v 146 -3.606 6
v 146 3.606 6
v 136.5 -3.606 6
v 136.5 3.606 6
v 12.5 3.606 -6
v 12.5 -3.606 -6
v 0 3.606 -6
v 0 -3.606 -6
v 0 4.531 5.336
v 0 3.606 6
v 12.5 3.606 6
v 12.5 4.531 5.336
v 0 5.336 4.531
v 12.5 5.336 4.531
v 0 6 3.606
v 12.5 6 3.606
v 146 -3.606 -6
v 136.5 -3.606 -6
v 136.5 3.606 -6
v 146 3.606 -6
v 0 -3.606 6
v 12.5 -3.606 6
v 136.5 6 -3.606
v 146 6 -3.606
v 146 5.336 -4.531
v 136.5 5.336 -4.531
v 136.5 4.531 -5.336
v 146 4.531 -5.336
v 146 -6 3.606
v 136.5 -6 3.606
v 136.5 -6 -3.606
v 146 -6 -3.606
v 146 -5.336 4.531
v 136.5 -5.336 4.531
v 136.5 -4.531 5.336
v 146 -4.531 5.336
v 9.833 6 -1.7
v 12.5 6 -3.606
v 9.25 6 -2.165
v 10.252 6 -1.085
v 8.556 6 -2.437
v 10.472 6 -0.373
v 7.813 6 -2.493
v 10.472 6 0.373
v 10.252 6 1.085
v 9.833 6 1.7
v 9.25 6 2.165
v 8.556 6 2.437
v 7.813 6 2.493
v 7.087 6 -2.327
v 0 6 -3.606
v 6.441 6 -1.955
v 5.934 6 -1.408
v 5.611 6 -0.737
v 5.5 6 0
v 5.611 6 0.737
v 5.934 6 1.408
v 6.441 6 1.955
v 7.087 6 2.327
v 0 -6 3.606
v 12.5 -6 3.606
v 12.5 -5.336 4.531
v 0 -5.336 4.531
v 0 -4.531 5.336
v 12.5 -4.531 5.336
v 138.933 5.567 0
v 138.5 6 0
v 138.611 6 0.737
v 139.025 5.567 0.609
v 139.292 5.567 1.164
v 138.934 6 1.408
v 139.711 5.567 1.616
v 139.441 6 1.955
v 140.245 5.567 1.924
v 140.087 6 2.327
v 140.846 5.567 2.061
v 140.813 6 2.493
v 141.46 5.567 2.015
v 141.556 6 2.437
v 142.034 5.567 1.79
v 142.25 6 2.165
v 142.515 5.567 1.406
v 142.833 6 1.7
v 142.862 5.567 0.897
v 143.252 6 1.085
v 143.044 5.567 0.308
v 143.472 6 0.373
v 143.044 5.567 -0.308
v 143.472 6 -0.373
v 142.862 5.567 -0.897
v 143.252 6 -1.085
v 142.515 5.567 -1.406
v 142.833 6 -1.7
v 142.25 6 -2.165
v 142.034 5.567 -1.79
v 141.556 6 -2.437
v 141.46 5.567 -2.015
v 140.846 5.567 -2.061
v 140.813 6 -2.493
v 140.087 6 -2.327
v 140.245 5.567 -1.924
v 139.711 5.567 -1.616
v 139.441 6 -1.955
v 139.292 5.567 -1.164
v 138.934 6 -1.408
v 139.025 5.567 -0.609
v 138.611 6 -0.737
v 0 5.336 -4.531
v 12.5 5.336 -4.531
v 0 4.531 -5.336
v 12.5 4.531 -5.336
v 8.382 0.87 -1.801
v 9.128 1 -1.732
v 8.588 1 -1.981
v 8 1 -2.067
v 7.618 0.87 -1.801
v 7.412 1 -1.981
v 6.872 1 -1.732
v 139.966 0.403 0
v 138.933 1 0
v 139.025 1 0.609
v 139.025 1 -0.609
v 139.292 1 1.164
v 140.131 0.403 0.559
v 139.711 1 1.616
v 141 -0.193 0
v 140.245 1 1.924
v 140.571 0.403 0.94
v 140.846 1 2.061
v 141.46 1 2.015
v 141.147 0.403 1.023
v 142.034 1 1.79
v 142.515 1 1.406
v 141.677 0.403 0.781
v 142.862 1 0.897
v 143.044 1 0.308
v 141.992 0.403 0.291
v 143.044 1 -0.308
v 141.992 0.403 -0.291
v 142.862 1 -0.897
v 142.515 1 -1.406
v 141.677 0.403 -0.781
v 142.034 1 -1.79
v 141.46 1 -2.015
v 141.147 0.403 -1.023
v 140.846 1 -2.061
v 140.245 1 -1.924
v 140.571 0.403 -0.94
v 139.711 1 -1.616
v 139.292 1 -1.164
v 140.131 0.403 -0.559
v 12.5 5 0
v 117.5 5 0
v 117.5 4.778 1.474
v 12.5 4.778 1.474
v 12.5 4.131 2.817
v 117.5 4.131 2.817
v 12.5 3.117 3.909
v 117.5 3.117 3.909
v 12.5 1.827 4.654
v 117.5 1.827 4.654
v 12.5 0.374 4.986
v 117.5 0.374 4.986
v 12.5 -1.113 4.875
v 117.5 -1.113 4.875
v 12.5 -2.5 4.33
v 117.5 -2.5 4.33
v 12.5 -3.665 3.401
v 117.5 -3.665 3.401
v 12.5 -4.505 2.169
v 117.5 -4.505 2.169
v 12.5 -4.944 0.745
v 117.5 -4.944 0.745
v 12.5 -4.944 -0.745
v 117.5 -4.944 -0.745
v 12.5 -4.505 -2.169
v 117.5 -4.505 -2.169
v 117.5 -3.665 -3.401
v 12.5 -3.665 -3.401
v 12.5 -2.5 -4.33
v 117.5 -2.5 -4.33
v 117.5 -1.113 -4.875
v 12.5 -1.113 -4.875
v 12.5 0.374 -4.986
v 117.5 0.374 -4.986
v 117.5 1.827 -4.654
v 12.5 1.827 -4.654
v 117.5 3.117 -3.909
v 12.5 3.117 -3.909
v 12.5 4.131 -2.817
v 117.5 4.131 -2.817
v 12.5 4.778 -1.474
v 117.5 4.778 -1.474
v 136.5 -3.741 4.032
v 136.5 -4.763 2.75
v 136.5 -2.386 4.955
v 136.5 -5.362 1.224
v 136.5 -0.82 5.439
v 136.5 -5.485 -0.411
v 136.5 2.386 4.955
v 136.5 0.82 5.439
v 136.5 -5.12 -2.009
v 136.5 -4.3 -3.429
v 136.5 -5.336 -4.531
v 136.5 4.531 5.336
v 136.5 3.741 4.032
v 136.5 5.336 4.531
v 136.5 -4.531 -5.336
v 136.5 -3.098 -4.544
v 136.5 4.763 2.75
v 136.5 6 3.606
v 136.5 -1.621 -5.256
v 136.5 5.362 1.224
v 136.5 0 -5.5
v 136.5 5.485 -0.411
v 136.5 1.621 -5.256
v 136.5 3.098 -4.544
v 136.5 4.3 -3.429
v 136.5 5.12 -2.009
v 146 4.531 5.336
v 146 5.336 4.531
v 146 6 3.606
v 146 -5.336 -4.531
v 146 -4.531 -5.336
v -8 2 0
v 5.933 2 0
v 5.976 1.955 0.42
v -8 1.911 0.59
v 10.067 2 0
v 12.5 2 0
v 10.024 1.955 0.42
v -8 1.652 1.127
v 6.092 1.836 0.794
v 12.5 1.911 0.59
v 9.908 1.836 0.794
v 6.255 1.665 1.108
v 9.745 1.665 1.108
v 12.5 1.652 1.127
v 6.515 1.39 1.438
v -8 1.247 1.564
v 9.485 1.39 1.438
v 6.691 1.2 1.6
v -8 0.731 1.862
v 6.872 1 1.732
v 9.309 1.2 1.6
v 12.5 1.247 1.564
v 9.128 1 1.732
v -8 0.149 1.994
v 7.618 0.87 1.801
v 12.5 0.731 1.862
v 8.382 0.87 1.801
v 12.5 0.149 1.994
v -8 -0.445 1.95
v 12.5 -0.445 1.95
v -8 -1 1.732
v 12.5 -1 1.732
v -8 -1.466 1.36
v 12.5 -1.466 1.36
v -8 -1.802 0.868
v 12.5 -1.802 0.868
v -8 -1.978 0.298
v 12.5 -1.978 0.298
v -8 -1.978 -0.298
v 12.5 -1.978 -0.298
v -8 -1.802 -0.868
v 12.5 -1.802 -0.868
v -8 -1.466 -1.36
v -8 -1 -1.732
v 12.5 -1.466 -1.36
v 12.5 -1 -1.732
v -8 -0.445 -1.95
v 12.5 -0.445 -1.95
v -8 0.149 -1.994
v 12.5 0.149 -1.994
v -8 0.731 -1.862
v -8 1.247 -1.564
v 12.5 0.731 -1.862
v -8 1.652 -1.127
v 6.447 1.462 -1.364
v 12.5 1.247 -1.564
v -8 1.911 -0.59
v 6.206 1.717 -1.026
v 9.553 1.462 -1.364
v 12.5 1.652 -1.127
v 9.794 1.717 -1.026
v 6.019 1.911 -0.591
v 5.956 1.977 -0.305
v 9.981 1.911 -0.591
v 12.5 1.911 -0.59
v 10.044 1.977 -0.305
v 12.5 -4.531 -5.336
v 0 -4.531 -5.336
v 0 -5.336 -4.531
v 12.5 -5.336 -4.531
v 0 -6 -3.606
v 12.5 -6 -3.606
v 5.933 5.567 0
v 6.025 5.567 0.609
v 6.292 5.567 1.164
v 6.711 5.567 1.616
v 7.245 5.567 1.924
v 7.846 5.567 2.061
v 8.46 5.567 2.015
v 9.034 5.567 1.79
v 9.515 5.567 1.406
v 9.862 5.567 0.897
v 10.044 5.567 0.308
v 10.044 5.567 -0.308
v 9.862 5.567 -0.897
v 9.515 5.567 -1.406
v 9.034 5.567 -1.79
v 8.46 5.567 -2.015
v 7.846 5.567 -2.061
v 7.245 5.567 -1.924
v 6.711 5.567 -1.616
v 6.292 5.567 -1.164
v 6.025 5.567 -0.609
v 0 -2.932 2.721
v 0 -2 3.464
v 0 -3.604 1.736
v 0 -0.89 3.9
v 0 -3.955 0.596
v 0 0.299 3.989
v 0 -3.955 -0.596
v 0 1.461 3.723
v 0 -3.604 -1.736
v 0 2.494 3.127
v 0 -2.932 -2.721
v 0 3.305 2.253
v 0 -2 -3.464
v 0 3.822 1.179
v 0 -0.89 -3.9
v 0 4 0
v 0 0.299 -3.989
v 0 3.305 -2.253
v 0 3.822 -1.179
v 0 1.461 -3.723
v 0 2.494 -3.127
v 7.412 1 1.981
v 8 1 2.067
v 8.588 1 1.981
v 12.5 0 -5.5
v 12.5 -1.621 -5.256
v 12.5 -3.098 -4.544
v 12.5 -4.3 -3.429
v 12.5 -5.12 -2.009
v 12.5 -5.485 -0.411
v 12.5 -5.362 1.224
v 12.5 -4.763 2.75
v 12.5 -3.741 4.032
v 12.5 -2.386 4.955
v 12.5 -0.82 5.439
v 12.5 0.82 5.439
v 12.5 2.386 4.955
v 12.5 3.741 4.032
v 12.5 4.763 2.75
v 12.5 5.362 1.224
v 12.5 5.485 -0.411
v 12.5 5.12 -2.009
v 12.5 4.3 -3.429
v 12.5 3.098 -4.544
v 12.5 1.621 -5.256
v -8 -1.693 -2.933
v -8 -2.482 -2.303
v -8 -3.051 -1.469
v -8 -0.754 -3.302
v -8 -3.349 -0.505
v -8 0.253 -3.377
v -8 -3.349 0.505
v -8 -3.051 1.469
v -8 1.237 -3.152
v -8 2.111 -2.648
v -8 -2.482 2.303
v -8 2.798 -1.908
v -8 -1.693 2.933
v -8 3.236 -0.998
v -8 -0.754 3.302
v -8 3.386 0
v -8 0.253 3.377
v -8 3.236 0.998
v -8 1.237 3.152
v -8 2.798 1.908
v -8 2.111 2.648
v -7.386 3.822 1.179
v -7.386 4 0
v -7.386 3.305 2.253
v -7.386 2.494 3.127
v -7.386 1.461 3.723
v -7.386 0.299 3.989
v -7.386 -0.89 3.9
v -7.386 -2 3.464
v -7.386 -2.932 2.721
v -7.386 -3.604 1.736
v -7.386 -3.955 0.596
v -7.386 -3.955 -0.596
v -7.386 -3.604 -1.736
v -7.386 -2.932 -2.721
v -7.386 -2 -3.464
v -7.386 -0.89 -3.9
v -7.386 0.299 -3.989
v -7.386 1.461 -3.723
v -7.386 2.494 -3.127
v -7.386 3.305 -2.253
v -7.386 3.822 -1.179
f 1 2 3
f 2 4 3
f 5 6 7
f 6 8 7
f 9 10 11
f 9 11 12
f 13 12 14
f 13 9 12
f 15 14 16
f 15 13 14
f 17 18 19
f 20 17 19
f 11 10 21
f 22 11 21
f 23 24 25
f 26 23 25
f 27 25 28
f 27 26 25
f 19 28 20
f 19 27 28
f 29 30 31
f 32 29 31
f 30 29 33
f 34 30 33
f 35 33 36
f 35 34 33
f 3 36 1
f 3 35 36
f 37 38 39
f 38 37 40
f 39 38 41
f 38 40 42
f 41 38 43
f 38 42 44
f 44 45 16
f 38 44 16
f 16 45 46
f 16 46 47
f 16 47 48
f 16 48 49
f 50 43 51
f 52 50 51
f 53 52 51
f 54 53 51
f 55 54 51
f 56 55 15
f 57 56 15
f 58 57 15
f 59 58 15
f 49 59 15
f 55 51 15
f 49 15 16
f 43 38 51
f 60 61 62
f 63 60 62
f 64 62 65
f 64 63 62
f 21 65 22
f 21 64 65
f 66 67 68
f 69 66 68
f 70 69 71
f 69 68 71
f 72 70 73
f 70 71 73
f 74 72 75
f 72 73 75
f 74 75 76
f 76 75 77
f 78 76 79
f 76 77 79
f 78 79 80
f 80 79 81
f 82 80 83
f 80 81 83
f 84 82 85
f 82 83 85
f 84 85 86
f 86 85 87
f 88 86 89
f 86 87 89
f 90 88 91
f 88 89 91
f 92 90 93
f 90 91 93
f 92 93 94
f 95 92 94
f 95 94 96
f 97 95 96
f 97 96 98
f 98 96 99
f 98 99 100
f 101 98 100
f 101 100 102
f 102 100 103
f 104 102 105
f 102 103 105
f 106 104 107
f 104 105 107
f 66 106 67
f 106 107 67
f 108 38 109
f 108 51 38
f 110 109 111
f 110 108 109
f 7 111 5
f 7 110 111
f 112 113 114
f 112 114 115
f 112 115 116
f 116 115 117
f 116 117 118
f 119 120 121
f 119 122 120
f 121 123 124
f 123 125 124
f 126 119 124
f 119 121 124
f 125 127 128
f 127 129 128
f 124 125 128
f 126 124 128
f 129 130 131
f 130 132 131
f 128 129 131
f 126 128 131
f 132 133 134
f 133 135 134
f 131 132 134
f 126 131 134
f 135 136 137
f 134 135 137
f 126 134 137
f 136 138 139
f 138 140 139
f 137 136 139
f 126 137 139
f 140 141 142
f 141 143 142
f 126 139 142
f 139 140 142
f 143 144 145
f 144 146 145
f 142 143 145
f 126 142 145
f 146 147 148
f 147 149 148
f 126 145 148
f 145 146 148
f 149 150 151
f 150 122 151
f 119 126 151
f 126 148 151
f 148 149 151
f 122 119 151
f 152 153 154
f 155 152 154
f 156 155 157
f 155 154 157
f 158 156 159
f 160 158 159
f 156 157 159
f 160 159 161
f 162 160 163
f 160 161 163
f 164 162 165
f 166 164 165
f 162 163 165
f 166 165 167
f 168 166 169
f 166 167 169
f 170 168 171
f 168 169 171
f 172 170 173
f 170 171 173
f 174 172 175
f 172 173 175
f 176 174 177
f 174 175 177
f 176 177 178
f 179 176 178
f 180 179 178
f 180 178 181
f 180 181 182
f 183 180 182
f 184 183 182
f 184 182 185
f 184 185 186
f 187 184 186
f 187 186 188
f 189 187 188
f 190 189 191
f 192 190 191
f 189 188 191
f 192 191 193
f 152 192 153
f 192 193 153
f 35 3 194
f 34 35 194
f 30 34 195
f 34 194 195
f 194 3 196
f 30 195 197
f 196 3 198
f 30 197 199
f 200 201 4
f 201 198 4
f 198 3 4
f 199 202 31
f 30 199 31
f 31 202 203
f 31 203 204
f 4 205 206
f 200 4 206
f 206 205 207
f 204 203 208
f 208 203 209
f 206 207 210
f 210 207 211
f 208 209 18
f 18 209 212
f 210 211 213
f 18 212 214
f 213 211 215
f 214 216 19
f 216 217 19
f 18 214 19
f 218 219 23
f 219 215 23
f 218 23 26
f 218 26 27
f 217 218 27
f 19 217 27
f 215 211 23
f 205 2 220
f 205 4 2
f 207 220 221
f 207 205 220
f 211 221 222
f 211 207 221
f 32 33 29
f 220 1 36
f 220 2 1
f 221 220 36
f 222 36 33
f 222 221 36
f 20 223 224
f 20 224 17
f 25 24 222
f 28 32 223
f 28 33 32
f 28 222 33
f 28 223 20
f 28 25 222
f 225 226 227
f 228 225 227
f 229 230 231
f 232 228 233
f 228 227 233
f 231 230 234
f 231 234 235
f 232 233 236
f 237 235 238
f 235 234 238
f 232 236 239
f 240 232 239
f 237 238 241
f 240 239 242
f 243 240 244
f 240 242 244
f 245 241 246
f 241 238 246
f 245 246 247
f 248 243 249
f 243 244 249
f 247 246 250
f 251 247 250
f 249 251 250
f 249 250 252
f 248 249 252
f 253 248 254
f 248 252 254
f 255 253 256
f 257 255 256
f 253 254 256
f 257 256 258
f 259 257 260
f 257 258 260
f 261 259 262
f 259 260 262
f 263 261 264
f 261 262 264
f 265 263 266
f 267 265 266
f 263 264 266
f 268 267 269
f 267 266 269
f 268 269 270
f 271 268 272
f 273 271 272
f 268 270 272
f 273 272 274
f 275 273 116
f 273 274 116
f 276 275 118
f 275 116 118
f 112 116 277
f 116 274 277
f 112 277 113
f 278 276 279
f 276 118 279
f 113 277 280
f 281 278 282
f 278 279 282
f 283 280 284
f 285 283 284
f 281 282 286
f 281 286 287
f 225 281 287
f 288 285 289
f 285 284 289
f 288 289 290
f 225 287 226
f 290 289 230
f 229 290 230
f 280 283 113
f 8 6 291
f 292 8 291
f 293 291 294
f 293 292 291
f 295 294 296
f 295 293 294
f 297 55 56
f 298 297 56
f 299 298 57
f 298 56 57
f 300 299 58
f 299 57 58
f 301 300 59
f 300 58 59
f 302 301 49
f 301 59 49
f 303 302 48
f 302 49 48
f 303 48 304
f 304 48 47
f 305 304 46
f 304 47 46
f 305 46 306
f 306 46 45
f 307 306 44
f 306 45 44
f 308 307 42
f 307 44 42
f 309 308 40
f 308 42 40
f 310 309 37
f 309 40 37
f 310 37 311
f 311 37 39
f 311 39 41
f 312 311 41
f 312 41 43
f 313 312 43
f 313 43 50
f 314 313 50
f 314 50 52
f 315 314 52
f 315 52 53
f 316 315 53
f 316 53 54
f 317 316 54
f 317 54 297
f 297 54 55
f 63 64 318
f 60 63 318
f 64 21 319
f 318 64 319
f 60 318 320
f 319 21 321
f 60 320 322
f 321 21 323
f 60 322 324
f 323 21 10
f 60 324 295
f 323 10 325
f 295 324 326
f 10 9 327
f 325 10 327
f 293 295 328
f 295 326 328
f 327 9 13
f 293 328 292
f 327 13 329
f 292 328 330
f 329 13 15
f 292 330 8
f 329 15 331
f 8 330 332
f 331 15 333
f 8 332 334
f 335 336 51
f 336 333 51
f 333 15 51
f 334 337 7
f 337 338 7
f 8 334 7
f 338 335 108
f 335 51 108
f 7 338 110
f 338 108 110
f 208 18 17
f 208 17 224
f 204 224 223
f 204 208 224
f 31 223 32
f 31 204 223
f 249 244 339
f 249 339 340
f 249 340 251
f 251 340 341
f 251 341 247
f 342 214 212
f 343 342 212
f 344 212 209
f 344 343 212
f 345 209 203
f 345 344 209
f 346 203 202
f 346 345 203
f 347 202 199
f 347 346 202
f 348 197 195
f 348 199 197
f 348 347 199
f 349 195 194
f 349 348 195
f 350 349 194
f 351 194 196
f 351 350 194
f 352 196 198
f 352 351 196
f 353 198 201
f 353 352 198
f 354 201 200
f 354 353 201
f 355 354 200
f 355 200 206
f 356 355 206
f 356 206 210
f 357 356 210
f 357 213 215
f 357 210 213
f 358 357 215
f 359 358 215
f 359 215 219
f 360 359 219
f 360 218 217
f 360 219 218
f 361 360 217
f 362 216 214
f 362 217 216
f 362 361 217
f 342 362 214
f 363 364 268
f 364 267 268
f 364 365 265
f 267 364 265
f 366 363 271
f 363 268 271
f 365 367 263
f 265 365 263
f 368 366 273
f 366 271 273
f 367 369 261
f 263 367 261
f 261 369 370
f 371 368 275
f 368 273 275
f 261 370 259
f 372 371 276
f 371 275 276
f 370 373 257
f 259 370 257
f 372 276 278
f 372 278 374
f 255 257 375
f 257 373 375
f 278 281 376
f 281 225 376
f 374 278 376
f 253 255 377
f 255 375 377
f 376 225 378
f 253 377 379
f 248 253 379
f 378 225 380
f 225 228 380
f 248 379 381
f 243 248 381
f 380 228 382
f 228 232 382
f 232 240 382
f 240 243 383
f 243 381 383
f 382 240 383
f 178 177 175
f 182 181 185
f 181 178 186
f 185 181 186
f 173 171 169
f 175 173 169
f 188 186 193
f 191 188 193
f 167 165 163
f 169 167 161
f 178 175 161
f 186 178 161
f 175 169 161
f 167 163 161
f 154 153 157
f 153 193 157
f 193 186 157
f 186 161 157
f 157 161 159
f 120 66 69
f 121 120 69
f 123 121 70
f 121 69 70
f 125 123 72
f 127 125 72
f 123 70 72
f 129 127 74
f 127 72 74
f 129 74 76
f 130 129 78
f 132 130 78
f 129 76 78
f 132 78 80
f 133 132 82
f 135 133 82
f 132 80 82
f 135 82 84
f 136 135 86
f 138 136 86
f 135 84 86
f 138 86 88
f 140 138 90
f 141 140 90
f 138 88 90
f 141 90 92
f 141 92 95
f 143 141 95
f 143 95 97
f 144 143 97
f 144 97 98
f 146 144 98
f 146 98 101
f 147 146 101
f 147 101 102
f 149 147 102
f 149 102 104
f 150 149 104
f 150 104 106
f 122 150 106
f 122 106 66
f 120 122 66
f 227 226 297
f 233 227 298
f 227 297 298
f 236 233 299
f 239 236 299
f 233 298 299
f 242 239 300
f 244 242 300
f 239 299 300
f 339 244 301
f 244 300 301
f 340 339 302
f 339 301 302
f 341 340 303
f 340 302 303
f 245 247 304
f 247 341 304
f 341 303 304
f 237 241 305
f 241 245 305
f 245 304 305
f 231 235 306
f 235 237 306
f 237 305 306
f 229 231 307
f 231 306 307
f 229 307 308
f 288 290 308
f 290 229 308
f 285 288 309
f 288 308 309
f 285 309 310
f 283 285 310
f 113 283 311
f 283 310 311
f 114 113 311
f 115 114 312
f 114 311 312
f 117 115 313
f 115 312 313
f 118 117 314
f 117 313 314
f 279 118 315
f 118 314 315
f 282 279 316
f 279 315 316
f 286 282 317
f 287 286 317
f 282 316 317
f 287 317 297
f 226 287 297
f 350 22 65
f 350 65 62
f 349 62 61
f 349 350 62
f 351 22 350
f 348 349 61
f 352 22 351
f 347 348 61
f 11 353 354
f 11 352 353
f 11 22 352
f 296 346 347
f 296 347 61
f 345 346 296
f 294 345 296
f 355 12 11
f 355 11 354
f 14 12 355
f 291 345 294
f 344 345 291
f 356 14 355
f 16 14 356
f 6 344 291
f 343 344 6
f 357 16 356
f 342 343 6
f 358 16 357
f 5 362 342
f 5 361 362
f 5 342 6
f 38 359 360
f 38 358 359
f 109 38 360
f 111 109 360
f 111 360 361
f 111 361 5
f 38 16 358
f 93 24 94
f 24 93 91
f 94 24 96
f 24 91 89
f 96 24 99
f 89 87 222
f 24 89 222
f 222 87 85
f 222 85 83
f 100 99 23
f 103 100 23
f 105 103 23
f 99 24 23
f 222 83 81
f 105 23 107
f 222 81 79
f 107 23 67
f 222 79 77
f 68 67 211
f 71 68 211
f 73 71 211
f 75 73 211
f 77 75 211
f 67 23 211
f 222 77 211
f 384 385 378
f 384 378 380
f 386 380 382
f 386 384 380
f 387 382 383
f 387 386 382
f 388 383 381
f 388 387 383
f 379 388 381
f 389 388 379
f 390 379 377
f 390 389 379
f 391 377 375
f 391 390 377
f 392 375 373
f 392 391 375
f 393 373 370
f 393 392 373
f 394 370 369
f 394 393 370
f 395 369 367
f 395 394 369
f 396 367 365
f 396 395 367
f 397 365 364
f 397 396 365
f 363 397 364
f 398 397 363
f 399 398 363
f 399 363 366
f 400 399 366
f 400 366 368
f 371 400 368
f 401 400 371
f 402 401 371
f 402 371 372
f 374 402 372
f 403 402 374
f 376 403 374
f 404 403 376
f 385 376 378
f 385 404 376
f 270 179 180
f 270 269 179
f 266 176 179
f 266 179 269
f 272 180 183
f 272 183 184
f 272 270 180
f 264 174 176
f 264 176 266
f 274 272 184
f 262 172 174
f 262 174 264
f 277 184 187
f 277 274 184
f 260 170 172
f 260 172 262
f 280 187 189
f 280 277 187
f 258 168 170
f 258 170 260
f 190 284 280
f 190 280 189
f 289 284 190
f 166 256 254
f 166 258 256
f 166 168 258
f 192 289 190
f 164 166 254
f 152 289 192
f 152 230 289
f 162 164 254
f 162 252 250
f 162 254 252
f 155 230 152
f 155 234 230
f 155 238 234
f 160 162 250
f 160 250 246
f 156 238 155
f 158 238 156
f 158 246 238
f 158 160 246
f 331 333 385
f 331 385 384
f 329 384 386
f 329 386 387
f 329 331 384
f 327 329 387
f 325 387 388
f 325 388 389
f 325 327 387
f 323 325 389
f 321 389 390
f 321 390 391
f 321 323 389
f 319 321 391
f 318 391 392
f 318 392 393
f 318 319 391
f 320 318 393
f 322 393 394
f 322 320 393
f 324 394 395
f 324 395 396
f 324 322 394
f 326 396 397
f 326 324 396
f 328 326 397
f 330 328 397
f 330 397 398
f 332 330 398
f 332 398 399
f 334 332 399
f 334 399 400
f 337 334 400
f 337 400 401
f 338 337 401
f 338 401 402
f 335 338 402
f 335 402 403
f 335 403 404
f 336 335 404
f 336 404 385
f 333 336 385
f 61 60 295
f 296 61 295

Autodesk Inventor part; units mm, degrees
sketch "Sketch_8" plane through (0, 0, 0) normal (0, 0, 1) x (1, 0, 0)
  line L0 (0, 0) -> (-8, 0)
  line L1 (-8, 0) -> (-8, 3.3865)
  line L2 (-8, 3.3865) -> (-7.3865, 4)
  line L3 (-7.3865, 4) -> (0, 4)
  line L4 (0, 4) -> (0, 0)
  line L5 (0, 0) -> (-8, 0)
revolve "Revolution1" add sketch "Sketch_8" angle 360 about axis through (0, 0, 0) along (1, 0, 0)
thread "Thread1" size "M8x1" class "6g" standard "ISO Metric profile" length 5.8865
sketch "Sketch_9" plane through (0, 0, 0) normal (1, 0, 0) x (0, 0, -1)
  line L0 (-6, 3.6056) -> (-6, -3.6056)
  arc A0 (-6, -3.6056) -> (-3.6056, -6) centre (0, 0) ccw
  line L1 (-3.6056, -6) -> (3.6056, -6)
  arc A1 (3.6056, -6) -> (6, -3.6056) centre (0, 0) ccw
  line L2 (6, -3.6056) -> (6, 3.6056)
  arc A2 (6, 3.6056) -> (3.6056, 6) centre (0, 0) ccw
  line L3 (3.6056, 6) -> (-3.6056, 6)
  arc A3 (-3.6056, 6) -> (-6, 3.6056) centre (0, 0) ccw
extrude "Extrusion1" add sketch "Sketch_9" along normal blind 12.5
sketch "Sketch_6" plane through (12.5, 0, 0) normal (1, 0, 0) x (0, 0, -1)
  circle A0 centre (0, 0) radius 5.5
extrude "Extrusion2" add sketch "Sketch_6" along normal blind 124
sketch "Sketch_10" plane through (136.5, 0, 0) normal (1, 0, 0) x (0, 0, -1)
  line L0 (-6, 3.6056) -> (-6, -3.6056)
  arc A0 (-6, -3.6056) -> (-3.6056, -6) centre (0, 0) ccw
  line L1 (-3.6056, -6) -> (3.6056, -6)
  arc A1 (3.6056, -6) -> (6, -3.6056) centre (0, 0) ccw
  line L2 (6, -3.6056) -> (6, 3.6056)
  arc A2 (6, 3.6056) -> (3.6056, 6) centre (0, 0) ccw
  line L3 (3.6056, 6) -> (-3.6056, 6)
  arc A3 (-3.6056, 6) -> (-6, 3.6056) centre (0, 0) ccw
extrude "Extrusion3" add sketch "Sketch_10" along normal blind 9.5
sketch "Sketch7" plane through (0, 0, 0) normal (0, 0, 1) x (1, 0, 0)
  line L0 (8, 6) -> (8, 1)
  line L1 (8, -0.1934) -> (5.933, 1)
  line L2 (5.933, 1) -> (5.933, 5.567)
  line L3 (5.933, 5.567) -> (5.5, 6)
  line L4 (5.5, 6) -> (8, 6)
  line L5 (8, 6) -> (8, -0.1934)
revolve "Revolution2" cut sketch "Sketch7" angle 360 about axis through (8, 6, 0) along (0, 1, 0)
thread "Thread2" size "M5x0.8" class "6H" standard "ISO Metric profile" full length
sketch "Sketch_7" plane through (0, 0, 0) normal (0, 0, 1) x (1, 0, 0)
  line L0 (141, 6) -> (141, 1)
  line L1 (141, -0.1934) -> (138.933, 1)
  line L2 (138.933, 1) -> (138.933, 5.567)
  line L3 (138.933, 5.567) -> (138.5, 6)
  line L4 (138.5, 6) -> (141, 6)
  line L5 (141, 6) -> (141, -0.1934)
revolve "Revolution3" cut sketch "Sketch_7" angle 360 about axis through (141, 6, 0) along (0, 1, 0)
thread "Thread3" size "M5x0.8" class "6H" standard "ISO Metric profile" full length
sketch "Sketch_16" plane through (0, 0, 0) normal (0, 0, 1) x (1, 0, 0)
  line L0 (117.5, 0) -> (-8, 0)
  line L1 (-8, 0) -> (-8, 2)
  line L2 (-8, 2) -> (12.5, 2)
  line L3 (12.5, 2) -> (12.5, 5)
  line L4 (12.5, 5) -> (117.5, 5)
  line L5 (117.5, 5) -> (117.5, 0)
  line L6 (117.5, 0) -> (-8, 0)
revolve "Revolution4" cut sketch "Sketch_16" angle 360 about axis through (117.5, 0, 0) along (1, 0, 0)
ref_plane "BODY_N_XY" through (146, 0, 0) normal (0, 0, -1) x (1, 0, 0)
ref_plane "BODY_N_YZ" through (146, 0, 0) normal (1, 0, 0) x (0, -1, 0)
ref_plane "BODY_N_ZX" through (146, 0, 0) normal (0, -1, 0) x (0, 0, -1)
ref_plane "NUT2_XY" through (146, 0, 0) normal (1, 0, 0) x (0, 0, -1)
ref_plane "NUT2_YZ" through (146, 0, 0) normal (0, 0, -1) x (0, 1, 0)
ref_plane "NUT2_ZX" through (146, 0, 0) normal (0, 1, 0) x (1, 0, 0)
ref_plane "SW1_XY" through (17, 0, 0) normal (1, 0, 0) x (0, 0, -1)
ref_plane "SW1_YZ" through (17, 0, 0) normal (0, 0, -1) x (0, 1, 0)
ref_plane "SW1_ZX" through (17, 0, 0) normal (0, 1, 0) x (1, 0, 0)
ref_plane "SW2_XY" through (132, 0, 0) normal (-1, 0, 0) x (0, 0, -1)
ref_plane "SW2_YZ" through (132, 0, 0) normal (0, 0, -1) x (0, -1, 0)
ref_plane "SW2_ZX" through (132, 0, 0) normal (0, -1, 0) x (-1, 0, 0)
ref_plane "SW_R1_XY" through (17, -11, 0) normal (1, 0, 0) x (0, 0, -1)
ref_plane "SW_R1_YZ" through (17, -11, 0) normal (0, 0, -1) x (0, 1, 0)
ref_plane "SW_R1_ZX" through (17, -11, 0) normal (0, 1, 0) x (1, 0, 0)
ref_plane "SW_R2_XY" through (132, -11, 0) normal (-1, 0, 0) x (0, 0, -1)
ref_plane "SW_R2_YZ" through (132, -11, 0) normal (0, 0, -1) x (0, -1, 0)
ref_plane "SW_R2_ZX" through (132, -11, 0) normal (0, -1, 0) x (-1, 0, 0)
ref_plane "body_XY" through (0, 0, 0) normal (1, 0, 0) x (0, 0, -1)
ref_plane "body_YZ" through (0, 0, 0) normal (0, 0, -1) x (0, 1, 0)
ref_plane "body_ZX" through (0, 0, 0) normal (0, 1, 0) x (1, 0, 0)
properties part number "CJ2B10-100Z(1_0)_BODY"
